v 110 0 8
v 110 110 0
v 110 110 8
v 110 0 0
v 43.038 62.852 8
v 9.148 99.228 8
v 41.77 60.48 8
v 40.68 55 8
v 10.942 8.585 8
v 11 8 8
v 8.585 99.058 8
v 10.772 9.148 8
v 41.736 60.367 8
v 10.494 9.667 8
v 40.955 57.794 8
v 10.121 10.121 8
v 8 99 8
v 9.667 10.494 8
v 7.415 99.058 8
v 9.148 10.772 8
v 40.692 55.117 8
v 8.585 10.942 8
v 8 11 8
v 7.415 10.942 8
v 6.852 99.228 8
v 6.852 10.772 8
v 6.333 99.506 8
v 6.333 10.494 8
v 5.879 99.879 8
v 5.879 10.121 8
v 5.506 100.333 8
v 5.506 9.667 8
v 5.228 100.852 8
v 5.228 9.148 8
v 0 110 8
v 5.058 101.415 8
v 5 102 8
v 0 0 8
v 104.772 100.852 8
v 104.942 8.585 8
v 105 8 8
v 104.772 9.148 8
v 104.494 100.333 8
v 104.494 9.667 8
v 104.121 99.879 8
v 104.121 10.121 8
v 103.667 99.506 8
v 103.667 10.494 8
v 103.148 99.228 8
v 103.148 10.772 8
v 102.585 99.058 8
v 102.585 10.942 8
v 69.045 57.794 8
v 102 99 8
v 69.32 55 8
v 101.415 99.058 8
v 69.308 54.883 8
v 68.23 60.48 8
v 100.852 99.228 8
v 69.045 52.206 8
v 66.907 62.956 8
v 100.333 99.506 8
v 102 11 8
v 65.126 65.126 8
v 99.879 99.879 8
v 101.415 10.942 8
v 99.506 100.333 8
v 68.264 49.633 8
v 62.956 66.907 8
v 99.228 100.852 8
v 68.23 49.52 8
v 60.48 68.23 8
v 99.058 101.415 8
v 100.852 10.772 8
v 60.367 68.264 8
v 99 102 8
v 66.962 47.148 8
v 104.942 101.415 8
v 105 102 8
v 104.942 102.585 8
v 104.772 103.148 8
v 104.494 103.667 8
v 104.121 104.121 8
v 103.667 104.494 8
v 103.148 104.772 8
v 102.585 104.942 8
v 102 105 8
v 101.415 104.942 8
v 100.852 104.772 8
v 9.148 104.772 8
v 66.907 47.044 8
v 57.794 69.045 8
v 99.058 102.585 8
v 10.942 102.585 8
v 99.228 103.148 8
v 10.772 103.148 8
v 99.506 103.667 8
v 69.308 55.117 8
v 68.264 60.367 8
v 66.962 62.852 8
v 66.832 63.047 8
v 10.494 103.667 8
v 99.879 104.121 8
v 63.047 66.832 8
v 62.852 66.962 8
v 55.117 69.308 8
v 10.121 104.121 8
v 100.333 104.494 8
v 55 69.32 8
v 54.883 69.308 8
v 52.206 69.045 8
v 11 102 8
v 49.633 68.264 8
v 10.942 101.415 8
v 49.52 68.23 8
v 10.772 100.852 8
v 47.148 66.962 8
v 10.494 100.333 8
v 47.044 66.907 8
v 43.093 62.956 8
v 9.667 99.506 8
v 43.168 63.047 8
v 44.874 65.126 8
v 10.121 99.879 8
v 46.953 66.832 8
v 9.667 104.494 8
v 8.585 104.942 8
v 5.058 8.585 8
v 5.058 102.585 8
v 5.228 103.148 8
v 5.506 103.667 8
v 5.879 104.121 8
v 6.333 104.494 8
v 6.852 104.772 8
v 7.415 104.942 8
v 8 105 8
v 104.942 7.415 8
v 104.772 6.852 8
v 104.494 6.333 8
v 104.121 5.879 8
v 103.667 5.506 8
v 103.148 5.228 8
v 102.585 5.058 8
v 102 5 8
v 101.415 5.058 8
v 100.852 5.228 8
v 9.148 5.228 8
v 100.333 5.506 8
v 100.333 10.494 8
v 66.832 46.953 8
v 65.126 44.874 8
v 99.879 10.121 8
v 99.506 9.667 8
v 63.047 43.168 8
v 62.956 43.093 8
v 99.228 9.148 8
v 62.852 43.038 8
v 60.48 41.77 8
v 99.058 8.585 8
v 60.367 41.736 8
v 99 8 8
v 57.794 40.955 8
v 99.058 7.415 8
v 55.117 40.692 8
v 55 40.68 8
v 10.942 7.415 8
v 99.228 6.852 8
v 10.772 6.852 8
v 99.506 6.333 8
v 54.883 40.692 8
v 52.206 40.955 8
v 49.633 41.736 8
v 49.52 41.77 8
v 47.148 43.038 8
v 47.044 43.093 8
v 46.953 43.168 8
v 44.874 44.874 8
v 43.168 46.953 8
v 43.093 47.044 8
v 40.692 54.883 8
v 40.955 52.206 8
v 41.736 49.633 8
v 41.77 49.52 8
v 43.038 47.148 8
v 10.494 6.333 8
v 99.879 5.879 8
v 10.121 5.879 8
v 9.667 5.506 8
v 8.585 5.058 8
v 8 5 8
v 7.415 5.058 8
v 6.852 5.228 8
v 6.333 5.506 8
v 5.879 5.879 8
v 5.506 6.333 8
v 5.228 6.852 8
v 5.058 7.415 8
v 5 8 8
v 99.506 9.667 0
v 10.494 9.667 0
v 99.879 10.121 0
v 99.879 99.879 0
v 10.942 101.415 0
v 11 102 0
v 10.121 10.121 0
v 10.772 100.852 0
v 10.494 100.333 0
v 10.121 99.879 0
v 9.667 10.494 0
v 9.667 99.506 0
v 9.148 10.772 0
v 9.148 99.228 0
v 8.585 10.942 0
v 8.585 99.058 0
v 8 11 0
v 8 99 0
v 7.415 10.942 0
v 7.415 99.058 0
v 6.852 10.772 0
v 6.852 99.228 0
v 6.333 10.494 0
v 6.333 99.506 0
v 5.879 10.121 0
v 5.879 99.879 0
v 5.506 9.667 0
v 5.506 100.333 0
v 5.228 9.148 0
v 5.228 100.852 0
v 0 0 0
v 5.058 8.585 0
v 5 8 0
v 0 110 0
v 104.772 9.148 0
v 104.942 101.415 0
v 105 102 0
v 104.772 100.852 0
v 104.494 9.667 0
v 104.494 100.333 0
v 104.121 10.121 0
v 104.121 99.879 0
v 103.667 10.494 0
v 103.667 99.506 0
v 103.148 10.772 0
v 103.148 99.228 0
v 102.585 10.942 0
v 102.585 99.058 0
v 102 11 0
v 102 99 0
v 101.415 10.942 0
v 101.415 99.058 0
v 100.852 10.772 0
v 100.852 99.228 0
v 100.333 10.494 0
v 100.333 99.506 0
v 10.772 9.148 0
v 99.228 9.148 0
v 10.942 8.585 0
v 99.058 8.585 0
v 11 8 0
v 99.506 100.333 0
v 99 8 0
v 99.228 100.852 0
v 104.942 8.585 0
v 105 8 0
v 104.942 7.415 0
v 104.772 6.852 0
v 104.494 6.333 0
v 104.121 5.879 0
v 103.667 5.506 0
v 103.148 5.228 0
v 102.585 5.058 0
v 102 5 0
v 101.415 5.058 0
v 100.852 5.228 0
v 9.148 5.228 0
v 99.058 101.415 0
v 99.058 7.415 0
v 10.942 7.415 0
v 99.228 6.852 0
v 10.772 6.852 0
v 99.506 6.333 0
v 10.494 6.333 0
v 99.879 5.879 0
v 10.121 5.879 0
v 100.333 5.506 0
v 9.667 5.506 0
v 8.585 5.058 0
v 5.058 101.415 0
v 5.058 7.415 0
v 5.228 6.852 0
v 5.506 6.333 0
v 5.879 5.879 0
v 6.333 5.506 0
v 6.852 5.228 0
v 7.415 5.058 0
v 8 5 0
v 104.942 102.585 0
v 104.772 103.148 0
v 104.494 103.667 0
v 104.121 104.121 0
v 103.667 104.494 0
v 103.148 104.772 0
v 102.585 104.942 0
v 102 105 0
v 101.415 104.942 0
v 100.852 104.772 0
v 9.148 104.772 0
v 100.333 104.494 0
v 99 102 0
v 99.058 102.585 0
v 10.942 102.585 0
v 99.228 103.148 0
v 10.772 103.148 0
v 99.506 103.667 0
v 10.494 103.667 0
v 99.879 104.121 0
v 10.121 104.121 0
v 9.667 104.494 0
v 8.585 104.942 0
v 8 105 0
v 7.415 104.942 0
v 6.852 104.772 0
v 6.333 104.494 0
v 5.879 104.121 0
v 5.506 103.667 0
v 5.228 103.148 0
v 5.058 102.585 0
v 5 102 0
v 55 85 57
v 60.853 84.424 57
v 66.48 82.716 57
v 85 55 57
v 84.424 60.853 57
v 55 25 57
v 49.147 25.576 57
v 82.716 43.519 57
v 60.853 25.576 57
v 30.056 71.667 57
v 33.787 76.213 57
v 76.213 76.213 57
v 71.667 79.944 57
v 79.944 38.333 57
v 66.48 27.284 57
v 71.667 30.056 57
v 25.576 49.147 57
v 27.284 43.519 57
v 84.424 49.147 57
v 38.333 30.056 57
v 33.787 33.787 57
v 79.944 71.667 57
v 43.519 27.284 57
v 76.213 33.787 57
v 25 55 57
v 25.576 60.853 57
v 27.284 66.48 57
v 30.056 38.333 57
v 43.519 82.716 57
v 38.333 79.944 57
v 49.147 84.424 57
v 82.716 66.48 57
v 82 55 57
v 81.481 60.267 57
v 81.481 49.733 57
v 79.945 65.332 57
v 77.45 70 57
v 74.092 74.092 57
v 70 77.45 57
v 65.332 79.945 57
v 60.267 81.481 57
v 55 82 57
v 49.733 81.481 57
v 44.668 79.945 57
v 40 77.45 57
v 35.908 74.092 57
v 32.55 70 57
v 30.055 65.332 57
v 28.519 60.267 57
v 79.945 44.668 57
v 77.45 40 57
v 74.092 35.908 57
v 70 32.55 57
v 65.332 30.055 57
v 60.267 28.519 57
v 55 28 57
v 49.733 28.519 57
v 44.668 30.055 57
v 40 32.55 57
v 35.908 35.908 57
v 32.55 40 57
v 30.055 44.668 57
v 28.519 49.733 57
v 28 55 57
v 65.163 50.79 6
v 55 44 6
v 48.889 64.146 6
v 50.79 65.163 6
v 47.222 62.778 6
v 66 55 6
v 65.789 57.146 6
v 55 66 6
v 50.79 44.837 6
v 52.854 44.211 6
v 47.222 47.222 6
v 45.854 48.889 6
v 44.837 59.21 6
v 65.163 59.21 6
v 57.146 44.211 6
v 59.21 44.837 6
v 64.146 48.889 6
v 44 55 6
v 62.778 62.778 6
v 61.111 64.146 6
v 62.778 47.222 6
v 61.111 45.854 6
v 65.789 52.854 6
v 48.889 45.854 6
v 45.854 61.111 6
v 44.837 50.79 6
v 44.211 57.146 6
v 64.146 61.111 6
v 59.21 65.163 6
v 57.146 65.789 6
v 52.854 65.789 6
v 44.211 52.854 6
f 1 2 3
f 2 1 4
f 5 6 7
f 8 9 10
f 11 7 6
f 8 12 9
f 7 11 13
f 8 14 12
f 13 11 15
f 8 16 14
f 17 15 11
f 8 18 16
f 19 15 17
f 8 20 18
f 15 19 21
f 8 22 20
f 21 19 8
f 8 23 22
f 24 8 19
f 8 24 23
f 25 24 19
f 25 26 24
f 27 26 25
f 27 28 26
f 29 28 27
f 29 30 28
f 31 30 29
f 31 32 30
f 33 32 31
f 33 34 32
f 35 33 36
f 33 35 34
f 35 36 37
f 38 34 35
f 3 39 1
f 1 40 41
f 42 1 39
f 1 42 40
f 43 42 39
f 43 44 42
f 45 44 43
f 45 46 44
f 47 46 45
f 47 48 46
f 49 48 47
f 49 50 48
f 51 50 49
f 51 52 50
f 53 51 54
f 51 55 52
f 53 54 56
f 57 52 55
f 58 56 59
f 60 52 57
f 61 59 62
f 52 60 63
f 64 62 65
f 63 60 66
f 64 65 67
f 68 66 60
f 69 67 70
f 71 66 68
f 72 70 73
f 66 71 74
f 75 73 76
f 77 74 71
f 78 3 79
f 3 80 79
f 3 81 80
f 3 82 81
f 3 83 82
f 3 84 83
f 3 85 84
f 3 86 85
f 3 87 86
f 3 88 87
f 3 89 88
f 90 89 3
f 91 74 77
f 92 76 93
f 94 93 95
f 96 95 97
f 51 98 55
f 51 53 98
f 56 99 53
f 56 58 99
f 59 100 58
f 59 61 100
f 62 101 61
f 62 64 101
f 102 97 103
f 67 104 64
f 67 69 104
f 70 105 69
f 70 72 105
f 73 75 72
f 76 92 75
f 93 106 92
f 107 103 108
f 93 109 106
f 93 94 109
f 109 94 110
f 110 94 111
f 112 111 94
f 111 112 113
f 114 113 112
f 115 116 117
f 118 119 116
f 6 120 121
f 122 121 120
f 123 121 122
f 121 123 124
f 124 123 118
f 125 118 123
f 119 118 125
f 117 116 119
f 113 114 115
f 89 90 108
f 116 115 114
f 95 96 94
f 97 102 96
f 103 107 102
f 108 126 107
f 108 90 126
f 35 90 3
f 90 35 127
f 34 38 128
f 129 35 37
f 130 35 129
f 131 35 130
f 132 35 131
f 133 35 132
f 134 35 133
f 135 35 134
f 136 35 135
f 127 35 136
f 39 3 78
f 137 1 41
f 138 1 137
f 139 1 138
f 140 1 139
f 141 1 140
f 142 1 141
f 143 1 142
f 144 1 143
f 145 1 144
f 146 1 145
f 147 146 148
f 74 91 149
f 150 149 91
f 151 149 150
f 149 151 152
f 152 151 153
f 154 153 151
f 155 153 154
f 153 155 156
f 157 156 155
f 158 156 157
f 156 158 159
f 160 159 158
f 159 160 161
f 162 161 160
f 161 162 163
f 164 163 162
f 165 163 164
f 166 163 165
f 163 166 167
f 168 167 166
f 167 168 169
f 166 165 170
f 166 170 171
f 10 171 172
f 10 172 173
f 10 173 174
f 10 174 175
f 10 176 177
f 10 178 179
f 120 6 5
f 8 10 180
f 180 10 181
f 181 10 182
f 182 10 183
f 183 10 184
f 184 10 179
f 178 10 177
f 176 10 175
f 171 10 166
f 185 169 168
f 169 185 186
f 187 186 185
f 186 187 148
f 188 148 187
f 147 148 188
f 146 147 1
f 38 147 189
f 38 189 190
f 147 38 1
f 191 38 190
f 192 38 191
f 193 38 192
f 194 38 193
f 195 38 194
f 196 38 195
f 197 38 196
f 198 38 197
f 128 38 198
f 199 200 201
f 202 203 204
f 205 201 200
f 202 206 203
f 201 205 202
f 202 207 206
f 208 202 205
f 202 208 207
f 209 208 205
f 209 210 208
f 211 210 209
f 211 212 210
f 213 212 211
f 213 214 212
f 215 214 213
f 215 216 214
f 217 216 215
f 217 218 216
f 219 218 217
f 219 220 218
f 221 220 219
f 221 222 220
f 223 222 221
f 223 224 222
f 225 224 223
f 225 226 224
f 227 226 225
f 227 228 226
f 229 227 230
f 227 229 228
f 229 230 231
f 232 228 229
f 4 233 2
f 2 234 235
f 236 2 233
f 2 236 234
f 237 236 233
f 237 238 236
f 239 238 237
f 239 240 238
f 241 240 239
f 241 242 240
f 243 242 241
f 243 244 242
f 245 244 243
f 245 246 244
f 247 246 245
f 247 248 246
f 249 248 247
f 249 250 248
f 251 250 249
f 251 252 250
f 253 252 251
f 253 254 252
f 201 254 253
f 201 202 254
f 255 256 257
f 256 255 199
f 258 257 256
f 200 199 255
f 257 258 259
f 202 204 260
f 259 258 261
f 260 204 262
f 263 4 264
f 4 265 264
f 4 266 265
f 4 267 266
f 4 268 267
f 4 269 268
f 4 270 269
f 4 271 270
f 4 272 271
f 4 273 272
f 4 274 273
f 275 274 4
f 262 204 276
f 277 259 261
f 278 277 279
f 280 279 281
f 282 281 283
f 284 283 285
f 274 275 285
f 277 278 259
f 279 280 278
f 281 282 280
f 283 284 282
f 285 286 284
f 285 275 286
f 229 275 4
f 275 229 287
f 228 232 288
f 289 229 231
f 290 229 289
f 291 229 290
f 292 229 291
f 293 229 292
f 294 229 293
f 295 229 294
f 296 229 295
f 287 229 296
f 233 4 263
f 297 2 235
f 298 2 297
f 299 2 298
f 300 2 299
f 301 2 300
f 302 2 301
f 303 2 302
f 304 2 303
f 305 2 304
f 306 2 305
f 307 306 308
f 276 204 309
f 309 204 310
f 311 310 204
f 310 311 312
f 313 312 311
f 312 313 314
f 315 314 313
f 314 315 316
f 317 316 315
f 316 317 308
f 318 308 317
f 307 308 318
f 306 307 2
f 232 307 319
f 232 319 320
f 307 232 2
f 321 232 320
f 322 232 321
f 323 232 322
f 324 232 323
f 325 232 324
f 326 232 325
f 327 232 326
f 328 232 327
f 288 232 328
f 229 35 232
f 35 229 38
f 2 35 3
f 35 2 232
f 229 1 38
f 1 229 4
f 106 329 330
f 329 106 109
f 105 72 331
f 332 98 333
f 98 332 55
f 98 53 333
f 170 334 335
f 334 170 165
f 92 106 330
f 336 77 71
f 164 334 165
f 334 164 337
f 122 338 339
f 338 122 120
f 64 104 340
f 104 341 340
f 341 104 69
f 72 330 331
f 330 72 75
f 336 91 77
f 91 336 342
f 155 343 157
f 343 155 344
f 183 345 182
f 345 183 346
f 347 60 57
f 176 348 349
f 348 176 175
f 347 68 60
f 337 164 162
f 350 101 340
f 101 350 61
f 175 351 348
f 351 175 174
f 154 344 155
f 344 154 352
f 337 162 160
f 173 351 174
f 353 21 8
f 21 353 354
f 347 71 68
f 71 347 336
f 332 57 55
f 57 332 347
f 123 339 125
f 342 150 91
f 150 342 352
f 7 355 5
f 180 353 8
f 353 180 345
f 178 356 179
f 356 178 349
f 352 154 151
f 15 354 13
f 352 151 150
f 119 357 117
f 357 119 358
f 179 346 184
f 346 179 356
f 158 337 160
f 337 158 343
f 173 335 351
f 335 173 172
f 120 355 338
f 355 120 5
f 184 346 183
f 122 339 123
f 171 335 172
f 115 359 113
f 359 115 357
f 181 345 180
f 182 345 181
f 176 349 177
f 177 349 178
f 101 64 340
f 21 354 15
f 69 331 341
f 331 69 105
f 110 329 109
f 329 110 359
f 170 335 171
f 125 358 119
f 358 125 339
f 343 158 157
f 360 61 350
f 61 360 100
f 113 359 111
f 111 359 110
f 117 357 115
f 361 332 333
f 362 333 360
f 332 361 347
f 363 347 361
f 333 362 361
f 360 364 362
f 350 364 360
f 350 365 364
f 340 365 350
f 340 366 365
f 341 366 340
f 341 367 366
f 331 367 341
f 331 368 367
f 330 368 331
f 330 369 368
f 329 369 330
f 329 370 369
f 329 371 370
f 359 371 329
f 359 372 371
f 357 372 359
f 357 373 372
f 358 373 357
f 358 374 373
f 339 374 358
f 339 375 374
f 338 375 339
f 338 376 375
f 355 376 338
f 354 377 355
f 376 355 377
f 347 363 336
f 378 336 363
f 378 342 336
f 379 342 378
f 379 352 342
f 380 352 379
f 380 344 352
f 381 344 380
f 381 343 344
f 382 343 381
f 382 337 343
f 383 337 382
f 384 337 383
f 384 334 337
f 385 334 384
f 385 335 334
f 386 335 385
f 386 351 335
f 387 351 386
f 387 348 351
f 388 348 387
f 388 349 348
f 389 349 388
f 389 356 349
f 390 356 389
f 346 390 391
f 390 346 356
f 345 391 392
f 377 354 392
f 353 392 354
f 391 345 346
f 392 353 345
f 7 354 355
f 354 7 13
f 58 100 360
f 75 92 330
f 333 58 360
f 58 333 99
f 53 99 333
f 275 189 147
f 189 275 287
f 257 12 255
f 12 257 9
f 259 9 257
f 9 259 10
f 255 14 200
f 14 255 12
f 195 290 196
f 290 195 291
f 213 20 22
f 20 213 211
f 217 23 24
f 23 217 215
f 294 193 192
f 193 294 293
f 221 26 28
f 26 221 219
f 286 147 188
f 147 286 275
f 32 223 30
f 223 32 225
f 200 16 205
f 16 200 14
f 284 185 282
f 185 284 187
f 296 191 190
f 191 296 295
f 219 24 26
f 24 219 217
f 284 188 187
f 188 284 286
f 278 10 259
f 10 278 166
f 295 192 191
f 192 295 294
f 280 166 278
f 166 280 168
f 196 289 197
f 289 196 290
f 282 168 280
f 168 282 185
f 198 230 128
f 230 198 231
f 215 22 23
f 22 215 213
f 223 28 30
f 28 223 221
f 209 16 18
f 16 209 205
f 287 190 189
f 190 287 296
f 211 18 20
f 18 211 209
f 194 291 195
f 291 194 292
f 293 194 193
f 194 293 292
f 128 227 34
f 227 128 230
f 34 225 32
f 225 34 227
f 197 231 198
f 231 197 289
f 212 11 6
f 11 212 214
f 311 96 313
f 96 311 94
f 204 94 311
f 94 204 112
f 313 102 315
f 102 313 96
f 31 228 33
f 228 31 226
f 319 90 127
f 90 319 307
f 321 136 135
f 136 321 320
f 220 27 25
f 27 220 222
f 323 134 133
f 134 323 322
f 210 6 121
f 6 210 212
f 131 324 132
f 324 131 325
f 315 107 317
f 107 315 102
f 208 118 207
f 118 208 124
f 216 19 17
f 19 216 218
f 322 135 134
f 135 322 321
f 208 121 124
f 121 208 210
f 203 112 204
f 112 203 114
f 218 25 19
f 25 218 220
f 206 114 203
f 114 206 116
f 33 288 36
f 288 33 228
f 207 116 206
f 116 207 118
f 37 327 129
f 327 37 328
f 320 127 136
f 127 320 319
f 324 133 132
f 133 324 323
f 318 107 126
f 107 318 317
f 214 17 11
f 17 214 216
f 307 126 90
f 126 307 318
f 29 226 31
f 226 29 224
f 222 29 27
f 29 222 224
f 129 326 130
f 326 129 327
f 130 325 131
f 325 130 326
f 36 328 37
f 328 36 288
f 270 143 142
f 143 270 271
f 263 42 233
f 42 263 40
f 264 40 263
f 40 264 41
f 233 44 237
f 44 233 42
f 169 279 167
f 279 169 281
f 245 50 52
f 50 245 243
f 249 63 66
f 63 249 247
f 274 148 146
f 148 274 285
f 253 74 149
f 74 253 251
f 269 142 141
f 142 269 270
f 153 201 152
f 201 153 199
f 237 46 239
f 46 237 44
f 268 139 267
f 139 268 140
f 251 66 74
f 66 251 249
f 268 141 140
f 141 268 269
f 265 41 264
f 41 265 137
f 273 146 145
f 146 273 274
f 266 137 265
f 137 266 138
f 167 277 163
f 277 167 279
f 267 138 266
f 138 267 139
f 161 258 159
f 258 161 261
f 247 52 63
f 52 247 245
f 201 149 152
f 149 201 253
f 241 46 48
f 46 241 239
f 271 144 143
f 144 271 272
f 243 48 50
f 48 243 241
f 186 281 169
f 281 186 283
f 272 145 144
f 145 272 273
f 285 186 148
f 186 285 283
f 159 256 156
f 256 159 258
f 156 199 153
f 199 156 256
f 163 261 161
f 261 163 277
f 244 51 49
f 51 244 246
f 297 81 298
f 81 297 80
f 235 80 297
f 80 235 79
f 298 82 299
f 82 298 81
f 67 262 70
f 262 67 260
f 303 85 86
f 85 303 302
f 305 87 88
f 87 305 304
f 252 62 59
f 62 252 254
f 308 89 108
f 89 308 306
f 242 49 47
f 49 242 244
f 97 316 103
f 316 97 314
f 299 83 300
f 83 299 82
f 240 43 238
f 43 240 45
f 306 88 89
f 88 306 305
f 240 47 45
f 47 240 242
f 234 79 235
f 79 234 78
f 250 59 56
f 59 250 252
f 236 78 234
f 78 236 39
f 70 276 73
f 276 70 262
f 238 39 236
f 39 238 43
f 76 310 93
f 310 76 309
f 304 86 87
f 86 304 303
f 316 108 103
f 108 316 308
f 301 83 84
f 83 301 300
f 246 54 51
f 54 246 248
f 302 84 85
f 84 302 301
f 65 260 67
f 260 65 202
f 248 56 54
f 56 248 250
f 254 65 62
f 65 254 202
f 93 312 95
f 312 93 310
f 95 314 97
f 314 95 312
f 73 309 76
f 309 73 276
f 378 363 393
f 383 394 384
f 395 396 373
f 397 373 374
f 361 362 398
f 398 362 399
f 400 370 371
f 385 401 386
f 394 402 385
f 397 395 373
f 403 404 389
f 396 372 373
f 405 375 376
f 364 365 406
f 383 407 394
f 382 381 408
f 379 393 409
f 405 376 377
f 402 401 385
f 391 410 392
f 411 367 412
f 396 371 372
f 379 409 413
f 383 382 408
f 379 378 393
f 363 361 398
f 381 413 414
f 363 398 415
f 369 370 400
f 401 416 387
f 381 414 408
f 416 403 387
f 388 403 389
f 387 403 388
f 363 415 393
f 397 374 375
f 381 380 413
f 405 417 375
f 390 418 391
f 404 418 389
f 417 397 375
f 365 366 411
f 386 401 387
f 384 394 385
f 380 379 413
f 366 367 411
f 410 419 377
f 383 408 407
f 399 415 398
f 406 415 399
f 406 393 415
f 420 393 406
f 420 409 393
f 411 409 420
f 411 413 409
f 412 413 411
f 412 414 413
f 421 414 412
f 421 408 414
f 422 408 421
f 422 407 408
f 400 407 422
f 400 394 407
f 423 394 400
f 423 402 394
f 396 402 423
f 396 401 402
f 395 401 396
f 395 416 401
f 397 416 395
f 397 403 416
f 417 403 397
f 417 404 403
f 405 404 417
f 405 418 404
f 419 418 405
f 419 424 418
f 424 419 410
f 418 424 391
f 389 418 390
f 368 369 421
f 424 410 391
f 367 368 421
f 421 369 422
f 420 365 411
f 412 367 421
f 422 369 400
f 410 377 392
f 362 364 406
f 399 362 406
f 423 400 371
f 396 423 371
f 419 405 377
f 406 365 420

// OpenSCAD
$fn = 32;

// ----------------------------------------------------------------------
// Hopper: flanged with square flange
// ----------------------------------------------------------------------

// --- parameters (mm) ---
fl = 110;                 // flange side, X and Y
fl_t = 8;                 // flange thickness
cone_h = 50;              // cone height above the flange
top_d = 60;               // cone mouth diameter
bot_d = 28;               // cone spout diameter
wall = 3;                 // cone wall thickness
hole_r = 3;               // flange hole radius
hole_in = 8;              // hole inset from the corners

bore_d = bot_d - 2 * wall;  // spout bore diameter
total_h = fl_t + cone_h - 1;  // overall height

difference() {
  union() {
    cube([fl, fl, fl_t]);
    translate([fl / 2, fl / 2, fl_t - 1])
      cylinder(h = cone_h, d1 = bot_d, d2 = top_d);
  }
  translate([fl / 2, fl / 2, fl_t - 2])
    cylinder(h = cone_h + 1, d1 = bore_d, d2 = top_d - 2 * wall);
  for (sx = [0, 1], sy = [0, 1])
    translate([sx ? fl - hole_in : hole_in,
               sy ? fl - hole_in : hole_in, -1])
      cylinder(r = hole_r, h = fl_t + 2);
}
